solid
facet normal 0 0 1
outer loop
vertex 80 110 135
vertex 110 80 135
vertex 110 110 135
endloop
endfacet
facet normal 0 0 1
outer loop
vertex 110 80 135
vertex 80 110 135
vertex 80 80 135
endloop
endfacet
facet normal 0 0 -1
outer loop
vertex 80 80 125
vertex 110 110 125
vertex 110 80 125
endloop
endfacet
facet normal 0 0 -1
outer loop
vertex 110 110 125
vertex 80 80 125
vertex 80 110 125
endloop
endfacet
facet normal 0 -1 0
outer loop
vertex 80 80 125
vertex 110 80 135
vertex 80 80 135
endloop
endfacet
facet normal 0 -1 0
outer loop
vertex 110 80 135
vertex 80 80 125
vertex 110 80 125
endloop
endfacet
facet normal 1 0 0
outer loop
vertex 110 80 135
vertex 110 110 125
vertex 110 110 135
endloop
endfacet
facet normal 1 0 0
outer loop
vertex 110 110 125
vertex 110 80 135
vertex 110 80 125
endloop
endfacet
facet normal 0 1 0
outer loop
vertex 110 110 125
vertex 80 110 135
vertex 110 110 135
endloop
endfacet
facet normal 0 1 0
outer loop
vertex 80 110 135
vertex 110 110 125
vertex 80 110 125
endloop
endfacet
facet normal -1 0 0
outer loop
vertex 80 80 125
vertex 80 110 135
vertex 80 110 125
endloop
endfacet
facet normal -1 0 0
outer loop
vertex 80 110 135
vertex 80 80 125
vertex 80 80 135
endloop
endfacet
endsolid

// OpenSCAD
// 30mm nominal fan relocation ALTERNATIVES, ONE ONLY, no real SKU. D7 source XY body z125-135.
$fn=24; site = 1;
centers=[[95,90],[95,95],[95,100]];
module review_fan(i){cx=centers[i][0];cy=centers[i][1];color([.3,.55,.7,.45])translate([cx-15,cy-15,125])cube([30,30,10]);}
for(i=[0:2]) if(site==i)review_fan(i);
// No 3D original D7 assembly included. Wood opening, airflow, thermal and current unqualified.
